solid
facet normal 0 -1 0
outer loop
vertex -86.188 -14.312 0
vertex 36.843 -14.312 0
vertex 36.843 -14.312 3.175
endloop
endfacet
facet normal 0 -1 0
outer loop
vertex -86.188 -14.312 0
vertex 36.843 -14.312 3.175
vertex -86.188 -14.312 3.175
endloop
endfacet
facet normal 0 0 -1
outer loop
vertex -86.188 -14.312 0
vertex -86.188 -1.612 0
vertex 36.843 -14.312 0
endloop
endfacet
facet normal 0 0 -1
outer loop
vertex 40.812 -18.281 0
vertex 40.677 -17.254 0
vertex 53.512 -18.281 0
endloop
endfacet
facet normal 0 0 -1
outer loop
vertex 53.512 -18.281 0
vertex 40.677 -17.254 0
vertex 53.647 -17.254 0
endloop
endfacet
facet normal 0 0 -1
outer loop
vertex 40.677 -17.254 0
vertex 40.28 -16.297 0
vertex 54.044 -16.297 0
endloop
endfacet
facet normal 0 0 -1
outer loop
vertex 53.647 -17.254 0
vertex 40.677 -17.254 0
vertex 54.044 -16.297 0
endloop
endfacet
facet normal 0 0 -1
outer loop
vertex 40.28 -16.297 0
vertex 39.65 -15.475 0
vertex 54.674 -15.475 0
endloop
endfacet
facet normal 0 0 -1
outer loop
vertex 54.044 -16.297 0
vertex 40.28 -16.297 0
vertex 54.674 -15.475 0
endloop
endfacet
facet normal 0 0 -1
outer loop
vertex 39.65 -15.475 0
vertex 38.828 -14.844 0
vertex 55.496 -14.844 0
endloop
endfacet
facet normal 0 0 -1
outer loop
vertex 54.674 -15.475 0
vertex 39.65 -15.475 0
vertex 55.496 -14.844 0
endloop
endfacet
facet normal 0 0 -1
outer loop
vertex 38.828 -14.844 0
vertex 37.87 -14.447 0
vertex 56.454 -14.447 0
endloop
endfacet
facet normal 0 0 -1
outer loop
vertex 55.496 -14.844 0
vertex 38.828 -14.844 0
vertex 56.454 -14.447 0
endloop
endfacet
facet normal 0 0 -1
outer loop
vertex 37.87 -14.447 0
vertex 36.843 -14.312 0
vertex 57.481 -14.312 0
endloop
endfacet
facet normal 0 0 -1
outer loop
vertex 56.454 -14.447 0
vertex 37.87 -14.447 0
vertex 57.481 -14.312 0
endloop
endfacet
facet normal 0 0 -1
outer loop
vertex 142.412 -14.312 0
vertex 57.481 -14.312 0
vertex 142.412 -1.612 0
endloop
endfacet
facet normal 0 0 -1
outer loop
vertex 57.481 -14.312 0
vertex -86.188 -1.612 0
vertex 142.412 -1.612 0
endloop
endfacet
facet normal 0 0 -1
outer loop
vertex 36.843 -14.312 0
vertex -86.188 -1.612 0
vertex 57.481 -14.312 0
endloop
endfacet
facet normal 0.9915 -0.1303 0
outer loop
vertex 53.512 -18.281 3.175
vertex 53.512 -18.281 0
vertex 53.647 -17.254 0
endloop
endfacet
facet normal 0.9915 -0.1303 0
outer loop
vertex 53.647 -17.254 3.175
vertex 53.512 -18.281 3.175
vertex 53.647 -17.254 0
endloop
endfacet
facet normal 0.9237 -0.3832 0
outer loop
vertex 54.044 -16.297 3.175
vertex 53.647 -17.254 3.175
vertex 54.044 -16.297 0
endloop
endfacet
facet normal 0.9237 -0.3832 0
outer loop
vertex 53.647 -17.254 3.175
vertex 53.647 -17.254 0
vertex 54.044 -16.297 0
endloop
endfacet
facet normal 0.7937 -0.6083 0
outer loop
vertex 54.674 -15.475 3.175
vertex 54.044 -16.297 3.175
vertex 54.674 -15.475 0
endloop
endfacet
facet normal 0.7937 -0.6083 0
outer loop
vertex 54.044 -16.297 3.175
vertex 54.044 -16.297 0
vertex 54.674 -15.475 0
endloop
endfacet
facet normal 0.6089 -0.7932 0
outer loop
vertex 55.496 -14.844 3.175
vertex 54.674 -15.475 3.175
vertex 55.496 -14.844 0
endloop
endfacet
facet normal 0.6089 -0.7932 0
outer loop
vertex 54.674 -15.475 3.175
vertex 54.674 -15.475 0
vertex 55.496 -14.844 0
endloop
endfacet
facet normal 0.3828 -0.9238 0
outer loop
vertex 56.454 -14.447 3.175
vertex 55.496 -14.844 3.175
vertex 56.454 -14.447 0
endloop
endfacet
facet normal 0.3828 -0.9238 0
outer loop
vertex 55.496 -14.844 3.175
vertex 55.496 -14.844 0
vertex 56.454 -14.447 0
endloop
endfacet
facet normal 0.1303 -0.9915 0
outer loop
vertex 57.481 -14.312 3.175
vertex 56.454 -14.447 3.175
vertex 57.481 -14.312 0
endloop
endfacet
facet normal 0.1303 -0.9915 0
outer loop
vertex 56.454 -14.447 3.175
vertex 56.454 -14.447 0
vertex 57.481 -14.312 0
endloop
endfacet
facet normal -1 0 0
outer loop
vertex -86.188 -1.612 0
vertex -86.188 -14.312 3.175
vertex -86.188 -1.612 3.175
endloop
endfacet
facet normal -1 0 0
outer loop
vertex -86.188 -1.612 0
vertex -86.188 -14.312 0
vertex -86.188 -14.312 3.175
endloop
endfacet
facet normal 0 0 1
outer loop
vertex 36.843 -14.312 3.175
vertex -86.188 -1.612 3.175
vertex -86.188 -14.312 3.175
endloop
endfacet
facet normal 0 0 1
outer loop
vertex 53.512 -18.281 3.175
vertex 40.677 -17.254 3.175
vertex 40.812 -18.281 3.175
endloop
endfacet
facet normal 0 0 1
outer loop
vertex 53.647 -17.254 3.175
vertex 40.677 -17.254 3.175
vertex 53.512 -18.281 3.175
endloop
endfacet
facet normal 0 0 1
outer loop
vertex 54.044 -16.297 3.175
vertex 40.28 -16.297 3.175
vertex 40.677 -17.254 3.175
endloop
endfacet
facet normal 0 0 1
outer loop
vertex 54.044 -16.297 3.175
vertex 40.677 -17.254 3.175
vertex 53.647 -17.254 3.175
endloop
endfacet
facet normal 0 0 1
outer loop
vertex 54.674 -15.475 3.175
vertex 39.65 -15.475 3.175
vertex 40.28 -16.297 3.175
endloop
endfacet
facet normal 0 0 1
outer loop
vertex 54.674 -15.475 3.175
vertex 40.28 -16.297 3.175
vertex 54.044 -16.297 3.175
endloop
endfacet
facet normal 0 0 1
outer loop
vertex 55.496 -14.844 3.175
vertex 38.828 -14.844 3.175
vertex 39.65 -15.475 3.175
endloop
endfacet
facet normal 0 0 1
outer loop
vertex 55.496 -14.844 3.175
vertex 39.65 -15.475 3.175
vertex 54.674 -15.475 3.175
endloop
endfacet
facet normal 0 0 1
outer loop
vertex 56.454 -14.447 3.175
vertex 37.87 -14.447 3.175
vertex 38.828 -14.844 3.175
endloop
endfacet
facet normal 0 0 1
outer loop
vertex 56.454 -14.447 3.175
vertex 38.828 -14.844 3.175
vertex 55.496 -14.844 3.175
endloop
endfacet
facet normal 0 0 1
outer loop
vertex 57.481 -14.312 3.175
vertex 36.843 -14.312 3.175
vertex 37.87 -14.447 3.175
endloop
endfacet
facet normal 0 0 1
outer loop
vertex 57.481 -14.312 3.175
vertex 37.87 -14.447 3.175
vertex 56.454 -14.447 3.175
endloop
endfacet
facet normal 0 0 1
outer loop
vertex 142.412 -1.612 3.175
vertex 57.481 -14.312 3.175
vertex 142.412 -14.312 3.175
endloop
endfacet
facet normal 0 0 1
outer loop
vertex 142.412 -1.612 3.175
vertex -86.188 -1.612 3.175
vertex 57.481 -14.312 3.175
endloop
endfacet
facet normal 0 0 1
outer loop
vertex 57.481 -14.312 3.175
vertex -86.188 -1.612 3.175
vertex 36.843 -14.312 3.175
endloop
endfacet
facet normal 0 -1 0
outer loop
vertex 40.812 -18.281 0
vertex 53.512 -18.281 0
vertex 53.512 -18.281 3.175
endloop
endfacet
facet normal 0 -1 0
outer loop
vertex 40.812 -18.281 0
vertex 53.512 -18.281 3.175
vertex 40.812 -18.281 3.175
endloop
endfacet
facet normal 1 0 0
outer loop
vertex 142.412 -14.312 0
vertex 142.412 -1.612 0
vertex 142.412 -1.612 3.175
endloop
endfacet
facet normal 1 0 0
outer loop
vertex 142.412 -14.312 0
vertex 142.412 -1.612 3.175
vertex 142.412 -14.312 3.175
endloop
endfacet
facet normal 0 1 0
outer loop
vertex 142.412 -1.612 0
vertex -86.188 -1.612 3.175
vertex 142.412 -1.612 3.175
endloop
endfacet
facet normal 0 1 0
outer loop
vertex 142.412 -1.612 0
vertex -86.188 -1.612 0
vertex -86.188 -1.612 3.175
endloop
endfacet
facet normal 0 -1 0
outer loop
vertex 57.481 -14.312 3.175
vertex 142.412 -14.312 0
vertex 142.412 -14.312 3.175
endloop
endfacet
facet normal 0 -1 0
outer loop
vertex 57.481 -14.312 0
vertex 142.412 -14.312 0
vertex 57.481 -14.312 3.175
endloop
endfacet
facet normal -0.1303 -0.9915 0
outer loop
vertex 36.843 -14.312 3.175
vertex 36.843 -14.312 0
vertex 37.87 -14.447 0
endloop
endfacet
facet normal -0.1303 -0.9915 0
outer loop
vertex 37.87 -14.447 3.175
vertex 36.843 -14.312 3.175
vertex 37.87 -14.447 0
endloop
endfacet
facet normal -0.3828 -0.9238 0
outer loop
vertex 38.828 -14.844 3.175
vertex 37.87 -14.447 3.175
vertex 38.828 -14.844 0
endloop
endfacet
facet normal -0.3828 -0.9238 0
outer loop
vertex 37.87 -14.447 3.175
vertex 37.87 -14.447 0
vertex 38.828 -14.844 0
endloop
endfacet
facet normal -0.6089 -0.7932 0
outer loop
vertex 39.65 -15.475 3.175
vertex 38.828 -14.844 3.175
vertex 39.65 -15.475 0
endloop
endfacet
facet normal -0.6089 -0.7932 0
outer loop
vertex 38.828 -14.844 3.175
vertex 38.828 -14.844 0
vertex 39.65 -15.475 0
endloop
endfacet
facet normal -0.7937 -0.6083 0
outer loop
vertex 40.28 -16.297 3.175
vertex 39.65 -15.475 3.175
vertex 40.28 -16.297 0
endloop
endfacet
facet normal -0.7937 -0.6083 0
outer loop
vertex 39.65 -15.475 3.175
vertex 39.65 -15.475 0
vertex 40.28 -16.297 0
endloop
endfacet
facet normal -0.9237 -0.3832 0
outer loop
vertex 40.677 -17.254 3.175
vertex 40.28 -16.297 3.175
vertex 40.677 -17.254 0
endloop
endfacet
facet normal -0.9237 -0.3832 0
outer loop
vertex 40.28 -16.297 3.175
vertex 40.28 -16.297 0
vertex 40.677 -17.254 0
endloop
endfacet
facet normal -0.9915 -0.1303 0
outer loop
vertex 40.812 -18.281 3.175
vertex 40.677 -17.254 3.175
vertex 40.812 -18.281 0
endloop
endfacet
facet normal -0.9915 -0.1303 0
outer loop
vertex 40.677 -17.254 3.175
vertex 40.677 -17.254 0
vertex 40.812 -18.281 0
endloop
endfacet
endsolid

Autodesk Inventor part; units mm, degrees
ref_plane "YZ Plane" through (0, 0, 0) normal (1, 0, 0) x (0, 1, 0)
ref_plane "XZ Plane" through (0, 0, 0) normal (0, 1, 0) x (-1, 0, 0)
ref_plane "XY Plane" through (0, 0, 0) normal (0, 0, 1) x (1, 0, 0)
sketch "Sketch1" plane through (0, 0, 0) normal (0, 0, 1) x (1, 0, 0)
  line L0 (-86.188, -1.6122) -> (142.412, -1.6122)
  line L1 (142.412, -1.6122) -> (142.412, -14.3122)
  line L2 (142.412, -14.3122) -> (57.4807, -14.3122)
  line L3 (-86.188, -14.3122) -> (-86.188, -1.6122)
  line L4 (53.512, -18.2809) -> (53.512, -18.2809)
  line L5 (53.512, -18.2809) -> (40.812, -18.2809)
  line L6 (40.812, -18.2809) -> (40.812, -18.2809)
  line L7 (36.8432, -14.3122) -> (-86.188, -14.3122)
  arc A0 (40.812, -18.2809) -> (36.8432, -14.3122) centre (36.8432, -18.2809) ccw
  arc A1 (57.4807, -14.3122) -> (53.512, -18.2809) centre (57.4807, -18.2809) ccw
  point P0 (0, 0)
  point P1 (53.512, -14.3122)
  dimension "d0" = 228.6
  dimension "d1" = 12.7
  dimension "d2" = 12.7
  dimension "d3" = 3.9688
  dimension "d4" = 88.9
  dimension "d5" = 3.9688
extrude "Extrusion1" add sketch "Sketch1" along normal blind 3.175
properties part number "Granny Gearbox Routing Template Horizontal Tabs"
